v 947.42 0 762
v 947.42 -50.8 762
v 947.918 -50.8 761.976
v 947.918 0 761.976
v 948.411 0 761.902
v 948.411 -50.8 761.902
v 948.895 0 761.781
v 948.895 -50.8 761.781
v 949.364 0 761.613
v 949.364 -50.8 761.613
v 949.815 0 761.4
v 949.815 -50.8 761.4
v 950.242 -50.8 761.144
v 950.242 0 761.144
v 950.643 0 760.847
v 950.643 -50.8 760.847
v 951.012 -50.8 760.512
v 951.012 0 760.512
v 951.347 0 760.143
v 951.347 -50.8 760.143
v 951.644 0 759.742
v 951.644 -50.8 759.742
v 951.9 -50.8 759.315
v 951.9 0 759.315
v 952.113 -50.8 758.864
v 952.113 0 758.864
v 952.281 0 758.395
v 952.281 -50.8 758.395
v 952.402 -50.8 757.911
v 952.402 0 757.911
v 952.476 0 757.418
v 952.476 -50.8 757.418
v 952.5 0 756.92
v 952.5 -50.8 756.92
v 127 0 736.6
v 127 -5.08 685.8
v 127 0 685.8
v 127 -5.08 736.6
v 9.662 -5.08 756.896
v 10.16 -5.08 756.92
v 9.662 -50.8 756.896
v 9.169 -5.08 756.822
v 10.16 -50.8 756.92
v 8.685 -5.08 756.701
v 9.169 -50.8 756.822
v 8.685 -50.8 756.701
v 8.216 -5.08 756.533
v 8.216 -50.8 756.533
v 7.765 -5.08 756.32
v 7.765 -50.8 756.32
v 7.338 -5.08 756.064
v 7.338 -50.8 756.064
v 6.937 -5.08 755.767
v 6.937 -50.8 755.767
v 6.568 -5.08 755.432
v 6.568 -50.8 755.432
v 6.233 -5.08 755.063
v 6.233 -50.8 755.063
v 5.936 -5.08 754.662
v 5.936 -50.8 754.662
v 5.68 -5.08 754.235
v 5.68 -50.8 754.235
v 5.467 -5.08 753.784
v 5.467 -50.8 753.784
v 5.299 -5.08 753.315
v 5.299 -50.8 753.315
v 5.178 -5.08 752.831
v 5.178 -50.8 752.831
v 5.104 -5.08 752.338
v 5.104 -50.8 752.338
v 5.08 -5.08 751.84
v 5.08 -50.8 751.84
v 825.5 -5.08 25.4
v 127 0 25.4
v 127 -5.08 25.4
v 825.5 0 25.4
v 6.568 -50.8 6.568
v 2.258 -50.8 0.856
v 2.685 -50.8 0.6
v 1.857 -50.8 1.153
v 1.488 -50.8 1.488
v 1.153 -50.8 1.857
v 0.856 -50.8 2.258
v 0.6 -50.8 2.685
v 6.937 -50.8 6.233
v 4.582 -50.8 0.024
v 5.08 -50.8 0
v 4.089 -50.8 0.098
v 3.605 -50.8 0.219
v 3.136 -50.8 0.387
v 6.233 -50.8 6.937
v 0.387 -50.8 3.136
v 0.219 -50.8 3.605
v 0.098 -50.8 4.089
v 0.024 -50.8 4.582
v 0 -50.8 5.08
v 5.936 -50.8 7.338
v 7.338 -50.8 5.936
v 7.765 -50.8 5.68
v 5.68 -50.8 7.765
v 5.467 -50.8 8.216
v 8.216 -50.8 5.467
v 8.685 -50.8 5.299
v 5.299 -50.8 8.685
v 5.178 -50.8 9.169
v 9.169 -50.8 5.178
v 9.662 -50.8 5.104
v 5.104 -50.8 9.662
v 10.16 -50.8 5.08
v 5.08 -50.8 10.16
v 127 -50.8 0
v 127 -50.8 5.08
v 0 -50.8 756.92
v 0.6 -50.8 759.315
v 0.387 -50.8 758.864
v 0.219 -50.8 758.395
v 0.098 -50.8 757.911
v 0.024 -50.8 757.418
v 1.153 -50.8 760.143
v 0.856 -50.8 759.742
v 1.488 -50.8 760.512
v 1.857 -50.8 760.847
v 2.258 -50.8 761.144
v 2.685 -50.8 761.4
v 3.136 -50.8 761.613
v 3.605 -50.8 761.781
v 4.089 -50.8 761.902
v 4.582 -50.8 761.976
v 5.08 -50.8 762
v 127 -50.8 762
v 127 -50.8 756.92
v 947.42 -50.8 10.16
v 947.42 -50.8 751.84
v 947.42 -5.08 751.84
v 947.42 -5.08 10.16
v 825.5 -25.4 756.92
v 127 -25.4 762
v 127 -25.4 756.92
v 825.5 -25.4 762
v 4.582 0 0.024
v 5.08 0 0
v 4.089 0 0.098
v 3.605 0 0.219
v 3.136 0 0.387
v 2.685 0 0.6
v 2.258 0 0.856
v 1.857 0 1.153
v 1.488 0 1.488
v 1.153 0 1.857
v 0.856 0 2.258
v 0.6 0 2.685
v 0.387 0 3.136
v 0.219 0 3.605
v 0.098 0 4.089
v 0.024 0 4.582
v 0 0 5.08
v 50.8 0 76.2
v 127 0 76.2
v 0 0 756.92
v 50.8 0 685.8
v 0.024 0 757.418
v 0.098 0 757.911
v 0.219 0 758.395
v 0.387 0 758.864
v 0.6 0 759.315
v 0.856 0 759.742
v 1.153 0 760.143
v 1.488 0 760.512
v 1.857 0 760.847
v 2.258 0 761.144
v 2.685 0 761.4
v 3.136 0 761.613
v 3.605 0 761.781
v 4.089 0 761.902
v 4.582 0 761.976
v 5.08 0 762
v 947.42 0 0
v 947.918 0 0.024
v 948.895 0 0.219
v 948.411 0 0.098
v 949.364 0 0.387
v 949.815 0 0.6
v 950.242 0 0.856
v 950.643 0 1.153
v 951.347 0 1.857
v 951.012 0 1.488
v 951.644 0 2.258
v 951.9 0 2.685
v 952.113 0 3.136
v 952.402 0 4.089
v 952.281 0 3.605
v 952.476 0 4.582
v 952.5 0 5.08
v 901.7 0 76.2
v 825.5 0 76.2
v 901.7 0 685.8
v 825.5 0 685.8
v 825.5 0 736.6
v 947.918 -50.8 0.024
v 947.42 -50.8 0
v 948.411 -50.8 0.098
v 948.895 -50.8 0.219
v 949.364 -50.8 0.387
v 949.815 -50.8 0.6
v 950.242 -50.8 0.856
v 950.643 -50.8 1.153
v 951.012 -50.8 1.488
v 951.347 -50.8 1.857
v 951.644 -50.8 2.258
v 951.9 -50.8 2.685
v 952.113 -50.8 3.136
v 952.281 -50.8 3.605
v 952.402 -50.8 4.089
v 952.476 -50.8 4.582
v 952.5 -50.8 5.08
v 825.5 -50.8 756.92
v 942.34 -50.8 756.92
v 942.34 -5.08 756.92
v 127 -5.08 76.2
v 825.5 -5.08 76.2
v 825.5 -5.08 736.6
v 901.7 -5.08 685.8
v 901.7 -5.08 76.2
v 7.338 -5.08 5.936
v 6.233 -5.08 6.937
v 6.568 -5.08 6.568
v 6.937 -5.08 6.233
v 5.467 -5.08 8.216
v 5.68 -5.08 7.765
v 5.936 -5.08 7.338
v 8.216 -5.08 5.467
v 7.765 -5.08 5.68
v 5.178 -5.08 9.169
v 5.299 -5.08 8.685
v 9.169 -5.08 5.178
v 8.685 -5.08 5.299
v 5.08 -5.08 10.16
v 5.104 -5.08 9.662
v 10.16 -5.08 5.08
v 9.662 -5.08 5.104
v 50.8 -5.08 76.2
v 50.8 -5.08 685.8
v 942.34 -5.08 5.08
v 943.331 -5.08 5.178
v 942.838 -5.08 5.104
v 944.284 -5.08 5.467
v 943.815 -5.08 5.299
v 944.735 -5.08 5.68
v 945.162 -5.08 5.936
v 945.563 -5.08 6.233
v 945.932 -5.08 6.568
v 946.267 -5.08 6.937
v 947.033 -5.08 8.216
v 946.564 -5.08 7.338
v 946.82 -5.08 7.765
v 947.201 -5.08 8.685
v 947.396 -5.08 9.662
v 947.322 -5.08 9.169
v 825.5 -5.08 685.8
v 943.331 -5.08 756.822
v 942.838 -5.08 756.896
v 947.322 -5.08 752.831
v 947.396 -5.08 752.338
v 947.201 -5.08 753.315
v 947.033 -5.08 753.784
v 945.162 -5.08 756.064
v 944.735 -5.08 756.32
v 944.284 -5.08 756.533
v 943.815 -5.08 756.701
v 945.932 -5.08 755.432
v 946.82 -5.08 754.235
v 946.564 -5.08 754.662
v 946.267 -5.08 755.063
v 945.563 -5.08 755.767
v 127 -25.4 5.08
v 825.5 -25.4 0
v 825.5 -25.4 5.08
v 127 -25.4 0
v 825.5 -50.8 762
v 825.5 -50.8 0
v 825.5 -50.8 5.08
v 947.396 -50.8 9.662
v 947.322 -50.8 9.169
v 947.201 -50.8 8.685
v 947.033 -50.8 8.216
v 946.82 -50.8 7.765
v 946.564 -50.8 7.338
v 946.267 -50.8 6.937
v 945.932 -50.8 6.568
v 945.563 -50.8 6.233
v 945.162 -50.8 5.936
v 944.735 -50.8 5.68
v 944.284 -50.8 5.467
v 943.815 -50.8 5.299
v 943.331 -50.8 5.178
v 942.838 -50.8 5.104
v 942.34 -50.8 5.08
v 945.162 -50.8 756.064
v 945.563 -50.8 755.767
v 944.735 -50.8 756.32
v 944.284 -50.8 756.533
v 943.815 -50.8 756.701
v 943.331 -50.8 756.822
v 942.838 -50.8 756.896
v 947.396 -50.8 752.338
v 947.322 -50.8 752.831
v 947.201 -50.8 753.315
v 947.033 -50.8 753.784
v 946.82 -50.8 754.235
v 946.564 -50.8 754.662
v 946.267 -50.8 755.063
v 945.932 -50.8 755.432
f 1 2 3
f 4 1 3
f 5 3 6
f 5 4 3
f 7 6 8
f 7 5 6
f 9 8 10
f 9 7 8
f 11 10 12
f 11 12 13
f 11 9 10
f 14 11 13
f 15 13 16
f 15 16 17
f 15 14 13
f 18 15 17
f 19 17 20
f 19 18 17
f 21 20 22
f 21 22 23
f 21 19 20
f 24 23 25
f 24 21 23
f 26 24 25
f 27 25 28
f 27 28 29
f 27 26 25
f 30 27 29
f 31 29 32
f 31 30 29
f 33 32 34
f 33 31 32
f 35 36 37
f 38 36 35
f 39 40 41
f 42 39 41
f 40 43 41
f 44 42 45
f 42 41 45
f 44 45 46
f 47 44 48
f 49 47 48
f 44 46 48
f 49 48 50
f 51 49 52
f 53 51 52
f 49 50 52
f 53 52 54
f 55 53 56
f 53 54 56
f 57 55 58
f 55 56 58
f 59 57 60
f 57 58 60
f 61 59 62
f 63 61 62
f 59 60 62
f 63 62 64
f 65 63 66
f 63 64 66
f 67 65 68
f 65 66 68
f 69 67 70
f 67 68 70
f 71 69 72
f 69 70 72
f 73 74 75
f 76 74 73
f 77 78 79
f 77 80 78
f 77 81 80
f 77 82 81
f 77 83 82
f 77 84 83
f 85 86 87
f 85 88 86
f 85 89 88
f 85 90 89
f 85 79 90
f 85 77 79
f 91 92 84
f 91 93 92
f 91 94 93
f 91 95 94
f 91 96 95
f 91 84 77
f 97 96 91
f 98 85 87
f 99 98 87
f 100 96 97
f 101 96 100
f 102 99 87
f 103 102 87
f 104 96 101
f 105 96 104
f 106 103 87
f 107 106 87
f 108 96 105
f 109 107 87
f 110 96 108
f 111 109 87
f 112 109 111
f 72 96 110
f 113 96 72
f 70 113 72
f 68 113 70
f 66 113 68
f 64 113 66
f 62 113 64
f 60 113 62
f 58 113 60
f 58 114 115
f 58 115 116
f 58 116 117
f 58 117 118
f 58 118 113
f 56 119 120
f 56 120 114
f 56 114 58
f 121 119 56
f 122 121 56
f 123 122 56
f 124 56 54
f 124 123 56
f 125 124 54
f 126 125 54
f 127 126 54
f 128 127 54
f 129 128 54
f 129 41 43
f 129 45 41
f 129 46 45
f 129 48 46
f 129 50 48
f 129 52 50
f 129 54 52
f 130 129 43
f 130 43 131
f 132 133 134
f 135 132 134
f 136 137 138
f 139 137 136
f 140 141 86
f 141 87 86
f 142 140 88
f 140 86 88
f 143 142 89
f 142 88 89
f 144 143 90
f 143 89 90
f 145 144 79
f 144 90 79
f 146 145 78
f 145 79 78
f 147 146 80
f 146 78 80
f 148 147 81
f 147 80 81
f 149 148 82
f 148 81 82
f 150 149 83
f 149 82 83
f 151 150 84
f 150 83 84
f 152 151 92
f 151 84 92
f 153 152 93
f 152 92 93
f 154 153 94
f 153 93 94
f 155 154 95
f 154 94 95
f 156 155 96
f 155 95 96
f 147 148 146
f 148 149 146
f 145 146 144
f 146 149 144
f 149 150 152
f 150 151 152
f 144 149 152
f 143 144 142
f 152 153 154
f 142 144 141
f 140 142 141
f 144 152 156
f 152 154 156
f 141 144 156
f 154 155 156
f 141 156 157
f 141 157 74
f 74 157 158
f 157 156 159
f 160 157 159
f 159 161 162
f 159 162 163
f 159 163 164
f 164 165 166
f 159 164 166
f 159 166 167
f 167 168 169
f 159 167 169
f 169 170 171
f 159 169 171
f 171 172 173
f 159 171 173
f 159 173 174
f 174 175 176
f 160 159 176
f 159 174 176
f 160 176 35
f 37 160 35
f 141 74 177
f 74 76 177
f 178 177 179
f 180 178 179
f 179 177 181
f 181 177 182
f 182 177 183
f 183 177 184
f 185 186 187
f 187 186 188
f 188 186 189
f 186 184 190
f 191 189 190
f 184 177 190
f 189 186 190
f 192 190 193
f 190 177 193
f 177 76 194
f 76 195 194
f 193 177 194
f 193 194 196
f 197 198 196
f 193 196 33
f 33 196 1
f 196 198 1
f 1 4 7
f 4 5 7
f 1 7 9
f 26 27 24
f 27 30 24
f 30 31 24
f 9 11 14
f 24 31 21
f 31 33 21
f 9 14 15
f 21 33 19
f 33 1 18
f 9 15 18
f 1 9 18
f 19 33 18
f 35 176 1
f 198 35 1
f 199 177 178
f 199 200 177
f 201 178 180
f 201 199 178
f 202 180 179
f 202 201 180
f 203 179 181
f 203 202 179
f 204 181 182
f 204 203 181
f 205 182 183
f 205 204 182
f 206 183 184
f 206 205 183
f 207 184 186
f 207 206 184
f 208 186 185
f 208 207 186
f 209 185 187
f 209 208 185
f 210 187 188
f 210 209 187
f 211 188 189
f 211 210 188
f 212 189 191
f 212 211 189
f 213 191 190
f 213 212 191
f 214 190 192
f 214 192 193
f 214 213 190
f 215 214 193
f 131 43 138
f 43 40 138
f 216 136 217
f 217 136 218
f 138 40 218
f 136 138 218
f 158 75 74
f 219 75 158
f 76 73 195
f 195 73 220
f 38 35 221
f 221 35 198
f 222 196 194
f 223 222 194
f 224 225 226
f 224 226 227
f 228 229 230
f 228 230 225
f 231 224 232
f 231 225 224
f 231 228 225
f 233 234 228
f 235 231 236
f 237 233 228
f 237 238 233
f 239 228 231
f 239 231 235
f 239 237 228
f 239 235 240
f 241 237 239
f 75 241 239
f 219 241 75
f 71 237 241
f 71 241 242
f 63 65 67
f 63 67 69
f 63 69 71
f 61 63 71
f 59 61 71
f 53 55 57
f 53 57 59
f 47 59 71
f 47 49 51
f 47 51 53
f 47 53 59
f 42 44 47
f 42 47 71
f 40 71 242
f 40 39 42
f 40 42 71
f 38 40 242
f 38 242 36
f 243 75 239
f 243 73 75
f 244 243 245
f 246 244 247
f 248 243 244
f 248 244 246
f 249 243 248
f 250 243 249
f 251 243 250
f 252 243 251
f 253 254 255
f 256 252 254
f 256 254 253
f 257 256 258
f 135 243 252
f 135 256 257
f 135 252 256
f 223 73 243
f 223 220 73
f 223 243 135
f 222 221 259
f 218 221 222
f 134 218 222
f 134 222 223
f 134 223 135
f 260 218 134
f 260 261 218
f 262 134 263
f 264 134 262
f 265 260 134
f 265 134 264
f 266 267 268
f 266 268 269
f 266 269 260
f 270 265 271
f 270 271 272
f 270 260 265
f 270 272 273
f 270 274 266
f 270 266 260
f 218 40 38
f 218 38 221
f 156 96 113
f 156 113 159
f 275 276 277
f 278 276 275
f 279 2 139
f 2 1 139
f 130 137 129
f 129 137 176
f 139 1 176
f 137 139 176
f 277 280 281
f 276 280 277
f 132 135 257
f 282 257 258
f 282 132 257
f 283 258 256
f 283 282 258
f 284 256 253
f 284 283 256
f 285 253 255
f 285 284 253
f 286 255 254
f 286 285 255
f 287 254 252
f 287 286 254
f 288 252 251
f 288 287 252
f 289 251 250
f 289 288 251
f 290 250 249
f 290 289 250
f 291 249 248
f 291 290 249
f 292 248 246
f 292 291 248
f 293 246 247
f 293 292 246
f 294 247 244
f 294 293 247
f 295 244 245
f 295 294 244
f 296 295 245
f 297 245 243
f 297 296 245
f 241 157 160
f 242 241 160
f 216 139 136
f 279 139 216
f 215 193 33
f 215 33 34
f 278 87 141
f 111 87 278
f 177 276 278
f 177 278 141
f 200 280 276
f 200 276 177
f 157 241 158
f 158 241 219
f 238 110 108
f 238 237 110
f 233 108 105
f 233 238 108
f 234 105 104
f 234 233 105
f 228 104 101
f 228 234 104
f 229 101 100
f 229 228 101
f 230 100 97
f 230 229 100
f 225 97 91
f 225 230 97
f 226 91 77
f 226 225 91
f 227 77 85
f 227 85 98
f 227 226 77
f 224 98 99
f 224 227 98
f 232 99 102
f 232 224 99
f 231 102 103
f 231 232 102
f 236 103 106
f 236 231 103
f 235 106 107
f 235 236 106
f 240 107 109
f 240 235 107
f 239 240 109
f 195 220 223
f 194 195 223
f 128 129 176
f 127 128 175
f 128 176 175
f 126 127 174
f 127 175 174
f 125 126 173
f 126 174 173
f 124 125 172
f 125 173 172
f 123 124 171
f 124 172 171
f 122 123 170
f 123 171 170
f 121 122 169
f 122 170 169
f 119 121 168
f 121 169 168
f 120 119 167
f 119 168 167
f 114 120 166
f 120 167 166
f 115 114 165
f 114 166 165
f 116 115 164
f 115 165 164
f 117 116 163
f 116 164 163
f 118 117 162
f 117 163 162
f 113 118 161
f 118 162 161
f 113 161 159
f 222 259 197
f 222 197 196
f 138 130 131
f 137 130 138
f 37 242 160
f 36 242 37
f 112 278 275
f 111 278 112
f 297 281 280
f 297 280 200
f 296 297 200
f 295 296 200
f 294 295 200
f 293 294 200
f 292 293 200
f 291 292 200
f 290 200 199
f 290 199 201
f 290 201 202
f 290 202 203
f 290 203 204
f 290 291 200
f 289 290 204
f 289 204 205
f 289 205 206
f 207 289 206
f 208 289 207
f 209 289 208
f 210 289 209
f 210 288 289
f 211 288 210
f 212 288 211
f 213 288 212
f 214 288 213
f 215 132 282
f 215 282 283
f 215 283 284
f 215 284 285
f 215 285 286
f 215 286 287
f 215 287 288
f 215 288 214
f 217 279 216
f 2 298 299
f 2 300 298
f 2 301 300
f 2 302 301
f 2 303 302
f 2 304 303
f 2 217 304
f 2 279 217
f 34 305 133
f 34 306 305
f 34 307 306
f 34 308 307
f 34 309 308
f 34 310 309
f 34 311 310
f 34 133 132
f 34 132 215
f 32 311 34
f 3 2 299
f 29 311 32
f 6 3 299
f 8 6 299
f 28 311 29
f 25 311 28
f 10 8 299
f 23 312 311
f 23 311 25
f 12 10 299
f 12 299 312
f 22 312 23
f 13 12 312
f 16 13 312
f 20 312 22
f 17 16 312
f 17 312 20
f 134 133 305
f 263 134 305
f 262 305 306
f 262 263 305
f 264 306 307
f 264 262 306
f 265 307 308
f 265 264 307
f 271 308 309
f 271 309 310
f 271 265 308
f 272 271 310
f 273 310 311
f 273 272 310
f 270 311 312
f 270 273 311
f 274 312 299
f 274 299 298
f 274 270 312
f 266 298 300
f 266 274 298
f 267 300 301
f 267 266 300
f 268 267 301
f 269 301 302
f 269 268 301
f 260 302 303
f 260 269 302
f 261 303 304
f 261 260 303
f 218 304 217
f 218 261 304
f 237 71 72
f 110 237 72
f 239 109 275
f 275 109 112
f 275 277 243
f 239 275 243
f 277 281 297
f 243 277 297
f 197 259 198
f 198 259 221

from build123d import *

# Parameters (mm, degrees)
F0_W      = 850.9
F0_H      = 25.4
F1_DEPTH  = 5.08
F3_DEPTH  = 5.08
F5_DEPTH  = 5.08
F7_DEPTH  = 5.08
F8_W      = 50.8
F8_H      = 762
F9_DEPTH  = 5.08
F10_R     = 5.08
F11_W     = 76.2
F11_H     = 50.8
F12_DEPTH = 5.08


with BuildPart() as f1:
    # F0 (on Front) → F1 (new body)
    with BuildSketch(Plane.XZ):
        Polygon((50.8, 50.8), (0, 0), (50.8, 0), (50.8, 25.4), align=None)
        Polygon((0, 762), (0, 0), (50.8, 50.8), (50.8, 711.2), align=None)
        Polygon((50.8, 762), (0, 762), (50.8, 711.2), (50.8, 736.6), align=None)
        with Locations((476.25, 12.7)):
            Rectangle(F0_W, F0_H)
        with Locations((476.25, 749.3)):
            Rectangle(F0_W, F0_H)
        Polygon((901.7, 25.4), (901.7, 0), (952.5, 0), (901.7, 50.8), align=None)
        Polygon((952.5, 762), (901.7, 762), (901.7, 736.6), (901.7, 711.2), align=None)
        Polygon((901.7, 50.8), (952.5, 0), (952.5, 762), (901.7, 711.2), align=None)
    extrude(amount=F1_DEPTH)

    # F2 (on face) → F3 (join)
    with BuildSketch(Plane(origin=(0, 0, 0), x_dir=(1, 0, 0), z_dir=(0, 0, -1))):
        Polygon((0, 50.8), (0, 0), (952.5, 0), (952.5, 50.8), (825.5, 50.8), (825.5, 25.4), (127, 25.4), (127, 50.8), align=None)
    extrude(amount=-F3_DEPTH)

    # F4 (on face) → F5 (join)
    with BuildSketch(Plane.XY.offset(762)):
        Polygon((952.5, 0), (0, 0), (0, -50.8), (127, -50.8), (127, -25.4), (825.5, -25.4), (825.5, -50.8), (952.5, -50.8), align=None)
    extrude(amount=-F5_DEPTH)

    # F6 (on face) → F7 (join)
    with BuildSketch(Plane(origin=(0, 0, 0), x_dir=(0, -1, 0), z_dir=(-1, 0, 0))):
        Polygon((0.254638, 756.92), (0.254638, 0), (50.8, 0), (50.8, 762), align=None)
    extrude(amount=-F7_DEPTH)

    # F8 (on face) → F9 (join)
    with BuildSketch(Plane.YZ.offset(952.5)):
        with Locations((-25.4, 381)):
            Rectangle(F8_W, F8_H)
    extrude(amount=-F9_DEPTH)

    # F10
    f10_edges = [f1.edges().sort_by_distance(p)[0] for p in [
        (0, -25.4, 0),
        (5.08, -27.94, 5.08),
        (5.08, -27.94, 756.92),
        (0, -25.4, 762),
        (952.5, -25.4, 762),
        (947.42, -27.94, 756.92),
        (952.5, -25.4, 0),
        (947.42, -27.94, 5.08),
    ]]
    fillet(f10_edges, radius=F10_R)

    # F11 (on face) → F12 (join)
    with BuildSketch(Plane.XZ.offset(5.08)):
        with Locations((863.6, 711.2)):
            Rectangle(F11_W, F11_H)
        with Locations((863.6, 50.8)):
            Rectangle(F11_W, F11_H)
        with Locations((88.9, 50.8)):
            Rectangle(F11_W, F11_H)
        with Locations((88.9, 711.2)):
            Rectangle(F11_W, F11_H)
    extrude(amount=-F12_DEPTH)


solid = f1.part
